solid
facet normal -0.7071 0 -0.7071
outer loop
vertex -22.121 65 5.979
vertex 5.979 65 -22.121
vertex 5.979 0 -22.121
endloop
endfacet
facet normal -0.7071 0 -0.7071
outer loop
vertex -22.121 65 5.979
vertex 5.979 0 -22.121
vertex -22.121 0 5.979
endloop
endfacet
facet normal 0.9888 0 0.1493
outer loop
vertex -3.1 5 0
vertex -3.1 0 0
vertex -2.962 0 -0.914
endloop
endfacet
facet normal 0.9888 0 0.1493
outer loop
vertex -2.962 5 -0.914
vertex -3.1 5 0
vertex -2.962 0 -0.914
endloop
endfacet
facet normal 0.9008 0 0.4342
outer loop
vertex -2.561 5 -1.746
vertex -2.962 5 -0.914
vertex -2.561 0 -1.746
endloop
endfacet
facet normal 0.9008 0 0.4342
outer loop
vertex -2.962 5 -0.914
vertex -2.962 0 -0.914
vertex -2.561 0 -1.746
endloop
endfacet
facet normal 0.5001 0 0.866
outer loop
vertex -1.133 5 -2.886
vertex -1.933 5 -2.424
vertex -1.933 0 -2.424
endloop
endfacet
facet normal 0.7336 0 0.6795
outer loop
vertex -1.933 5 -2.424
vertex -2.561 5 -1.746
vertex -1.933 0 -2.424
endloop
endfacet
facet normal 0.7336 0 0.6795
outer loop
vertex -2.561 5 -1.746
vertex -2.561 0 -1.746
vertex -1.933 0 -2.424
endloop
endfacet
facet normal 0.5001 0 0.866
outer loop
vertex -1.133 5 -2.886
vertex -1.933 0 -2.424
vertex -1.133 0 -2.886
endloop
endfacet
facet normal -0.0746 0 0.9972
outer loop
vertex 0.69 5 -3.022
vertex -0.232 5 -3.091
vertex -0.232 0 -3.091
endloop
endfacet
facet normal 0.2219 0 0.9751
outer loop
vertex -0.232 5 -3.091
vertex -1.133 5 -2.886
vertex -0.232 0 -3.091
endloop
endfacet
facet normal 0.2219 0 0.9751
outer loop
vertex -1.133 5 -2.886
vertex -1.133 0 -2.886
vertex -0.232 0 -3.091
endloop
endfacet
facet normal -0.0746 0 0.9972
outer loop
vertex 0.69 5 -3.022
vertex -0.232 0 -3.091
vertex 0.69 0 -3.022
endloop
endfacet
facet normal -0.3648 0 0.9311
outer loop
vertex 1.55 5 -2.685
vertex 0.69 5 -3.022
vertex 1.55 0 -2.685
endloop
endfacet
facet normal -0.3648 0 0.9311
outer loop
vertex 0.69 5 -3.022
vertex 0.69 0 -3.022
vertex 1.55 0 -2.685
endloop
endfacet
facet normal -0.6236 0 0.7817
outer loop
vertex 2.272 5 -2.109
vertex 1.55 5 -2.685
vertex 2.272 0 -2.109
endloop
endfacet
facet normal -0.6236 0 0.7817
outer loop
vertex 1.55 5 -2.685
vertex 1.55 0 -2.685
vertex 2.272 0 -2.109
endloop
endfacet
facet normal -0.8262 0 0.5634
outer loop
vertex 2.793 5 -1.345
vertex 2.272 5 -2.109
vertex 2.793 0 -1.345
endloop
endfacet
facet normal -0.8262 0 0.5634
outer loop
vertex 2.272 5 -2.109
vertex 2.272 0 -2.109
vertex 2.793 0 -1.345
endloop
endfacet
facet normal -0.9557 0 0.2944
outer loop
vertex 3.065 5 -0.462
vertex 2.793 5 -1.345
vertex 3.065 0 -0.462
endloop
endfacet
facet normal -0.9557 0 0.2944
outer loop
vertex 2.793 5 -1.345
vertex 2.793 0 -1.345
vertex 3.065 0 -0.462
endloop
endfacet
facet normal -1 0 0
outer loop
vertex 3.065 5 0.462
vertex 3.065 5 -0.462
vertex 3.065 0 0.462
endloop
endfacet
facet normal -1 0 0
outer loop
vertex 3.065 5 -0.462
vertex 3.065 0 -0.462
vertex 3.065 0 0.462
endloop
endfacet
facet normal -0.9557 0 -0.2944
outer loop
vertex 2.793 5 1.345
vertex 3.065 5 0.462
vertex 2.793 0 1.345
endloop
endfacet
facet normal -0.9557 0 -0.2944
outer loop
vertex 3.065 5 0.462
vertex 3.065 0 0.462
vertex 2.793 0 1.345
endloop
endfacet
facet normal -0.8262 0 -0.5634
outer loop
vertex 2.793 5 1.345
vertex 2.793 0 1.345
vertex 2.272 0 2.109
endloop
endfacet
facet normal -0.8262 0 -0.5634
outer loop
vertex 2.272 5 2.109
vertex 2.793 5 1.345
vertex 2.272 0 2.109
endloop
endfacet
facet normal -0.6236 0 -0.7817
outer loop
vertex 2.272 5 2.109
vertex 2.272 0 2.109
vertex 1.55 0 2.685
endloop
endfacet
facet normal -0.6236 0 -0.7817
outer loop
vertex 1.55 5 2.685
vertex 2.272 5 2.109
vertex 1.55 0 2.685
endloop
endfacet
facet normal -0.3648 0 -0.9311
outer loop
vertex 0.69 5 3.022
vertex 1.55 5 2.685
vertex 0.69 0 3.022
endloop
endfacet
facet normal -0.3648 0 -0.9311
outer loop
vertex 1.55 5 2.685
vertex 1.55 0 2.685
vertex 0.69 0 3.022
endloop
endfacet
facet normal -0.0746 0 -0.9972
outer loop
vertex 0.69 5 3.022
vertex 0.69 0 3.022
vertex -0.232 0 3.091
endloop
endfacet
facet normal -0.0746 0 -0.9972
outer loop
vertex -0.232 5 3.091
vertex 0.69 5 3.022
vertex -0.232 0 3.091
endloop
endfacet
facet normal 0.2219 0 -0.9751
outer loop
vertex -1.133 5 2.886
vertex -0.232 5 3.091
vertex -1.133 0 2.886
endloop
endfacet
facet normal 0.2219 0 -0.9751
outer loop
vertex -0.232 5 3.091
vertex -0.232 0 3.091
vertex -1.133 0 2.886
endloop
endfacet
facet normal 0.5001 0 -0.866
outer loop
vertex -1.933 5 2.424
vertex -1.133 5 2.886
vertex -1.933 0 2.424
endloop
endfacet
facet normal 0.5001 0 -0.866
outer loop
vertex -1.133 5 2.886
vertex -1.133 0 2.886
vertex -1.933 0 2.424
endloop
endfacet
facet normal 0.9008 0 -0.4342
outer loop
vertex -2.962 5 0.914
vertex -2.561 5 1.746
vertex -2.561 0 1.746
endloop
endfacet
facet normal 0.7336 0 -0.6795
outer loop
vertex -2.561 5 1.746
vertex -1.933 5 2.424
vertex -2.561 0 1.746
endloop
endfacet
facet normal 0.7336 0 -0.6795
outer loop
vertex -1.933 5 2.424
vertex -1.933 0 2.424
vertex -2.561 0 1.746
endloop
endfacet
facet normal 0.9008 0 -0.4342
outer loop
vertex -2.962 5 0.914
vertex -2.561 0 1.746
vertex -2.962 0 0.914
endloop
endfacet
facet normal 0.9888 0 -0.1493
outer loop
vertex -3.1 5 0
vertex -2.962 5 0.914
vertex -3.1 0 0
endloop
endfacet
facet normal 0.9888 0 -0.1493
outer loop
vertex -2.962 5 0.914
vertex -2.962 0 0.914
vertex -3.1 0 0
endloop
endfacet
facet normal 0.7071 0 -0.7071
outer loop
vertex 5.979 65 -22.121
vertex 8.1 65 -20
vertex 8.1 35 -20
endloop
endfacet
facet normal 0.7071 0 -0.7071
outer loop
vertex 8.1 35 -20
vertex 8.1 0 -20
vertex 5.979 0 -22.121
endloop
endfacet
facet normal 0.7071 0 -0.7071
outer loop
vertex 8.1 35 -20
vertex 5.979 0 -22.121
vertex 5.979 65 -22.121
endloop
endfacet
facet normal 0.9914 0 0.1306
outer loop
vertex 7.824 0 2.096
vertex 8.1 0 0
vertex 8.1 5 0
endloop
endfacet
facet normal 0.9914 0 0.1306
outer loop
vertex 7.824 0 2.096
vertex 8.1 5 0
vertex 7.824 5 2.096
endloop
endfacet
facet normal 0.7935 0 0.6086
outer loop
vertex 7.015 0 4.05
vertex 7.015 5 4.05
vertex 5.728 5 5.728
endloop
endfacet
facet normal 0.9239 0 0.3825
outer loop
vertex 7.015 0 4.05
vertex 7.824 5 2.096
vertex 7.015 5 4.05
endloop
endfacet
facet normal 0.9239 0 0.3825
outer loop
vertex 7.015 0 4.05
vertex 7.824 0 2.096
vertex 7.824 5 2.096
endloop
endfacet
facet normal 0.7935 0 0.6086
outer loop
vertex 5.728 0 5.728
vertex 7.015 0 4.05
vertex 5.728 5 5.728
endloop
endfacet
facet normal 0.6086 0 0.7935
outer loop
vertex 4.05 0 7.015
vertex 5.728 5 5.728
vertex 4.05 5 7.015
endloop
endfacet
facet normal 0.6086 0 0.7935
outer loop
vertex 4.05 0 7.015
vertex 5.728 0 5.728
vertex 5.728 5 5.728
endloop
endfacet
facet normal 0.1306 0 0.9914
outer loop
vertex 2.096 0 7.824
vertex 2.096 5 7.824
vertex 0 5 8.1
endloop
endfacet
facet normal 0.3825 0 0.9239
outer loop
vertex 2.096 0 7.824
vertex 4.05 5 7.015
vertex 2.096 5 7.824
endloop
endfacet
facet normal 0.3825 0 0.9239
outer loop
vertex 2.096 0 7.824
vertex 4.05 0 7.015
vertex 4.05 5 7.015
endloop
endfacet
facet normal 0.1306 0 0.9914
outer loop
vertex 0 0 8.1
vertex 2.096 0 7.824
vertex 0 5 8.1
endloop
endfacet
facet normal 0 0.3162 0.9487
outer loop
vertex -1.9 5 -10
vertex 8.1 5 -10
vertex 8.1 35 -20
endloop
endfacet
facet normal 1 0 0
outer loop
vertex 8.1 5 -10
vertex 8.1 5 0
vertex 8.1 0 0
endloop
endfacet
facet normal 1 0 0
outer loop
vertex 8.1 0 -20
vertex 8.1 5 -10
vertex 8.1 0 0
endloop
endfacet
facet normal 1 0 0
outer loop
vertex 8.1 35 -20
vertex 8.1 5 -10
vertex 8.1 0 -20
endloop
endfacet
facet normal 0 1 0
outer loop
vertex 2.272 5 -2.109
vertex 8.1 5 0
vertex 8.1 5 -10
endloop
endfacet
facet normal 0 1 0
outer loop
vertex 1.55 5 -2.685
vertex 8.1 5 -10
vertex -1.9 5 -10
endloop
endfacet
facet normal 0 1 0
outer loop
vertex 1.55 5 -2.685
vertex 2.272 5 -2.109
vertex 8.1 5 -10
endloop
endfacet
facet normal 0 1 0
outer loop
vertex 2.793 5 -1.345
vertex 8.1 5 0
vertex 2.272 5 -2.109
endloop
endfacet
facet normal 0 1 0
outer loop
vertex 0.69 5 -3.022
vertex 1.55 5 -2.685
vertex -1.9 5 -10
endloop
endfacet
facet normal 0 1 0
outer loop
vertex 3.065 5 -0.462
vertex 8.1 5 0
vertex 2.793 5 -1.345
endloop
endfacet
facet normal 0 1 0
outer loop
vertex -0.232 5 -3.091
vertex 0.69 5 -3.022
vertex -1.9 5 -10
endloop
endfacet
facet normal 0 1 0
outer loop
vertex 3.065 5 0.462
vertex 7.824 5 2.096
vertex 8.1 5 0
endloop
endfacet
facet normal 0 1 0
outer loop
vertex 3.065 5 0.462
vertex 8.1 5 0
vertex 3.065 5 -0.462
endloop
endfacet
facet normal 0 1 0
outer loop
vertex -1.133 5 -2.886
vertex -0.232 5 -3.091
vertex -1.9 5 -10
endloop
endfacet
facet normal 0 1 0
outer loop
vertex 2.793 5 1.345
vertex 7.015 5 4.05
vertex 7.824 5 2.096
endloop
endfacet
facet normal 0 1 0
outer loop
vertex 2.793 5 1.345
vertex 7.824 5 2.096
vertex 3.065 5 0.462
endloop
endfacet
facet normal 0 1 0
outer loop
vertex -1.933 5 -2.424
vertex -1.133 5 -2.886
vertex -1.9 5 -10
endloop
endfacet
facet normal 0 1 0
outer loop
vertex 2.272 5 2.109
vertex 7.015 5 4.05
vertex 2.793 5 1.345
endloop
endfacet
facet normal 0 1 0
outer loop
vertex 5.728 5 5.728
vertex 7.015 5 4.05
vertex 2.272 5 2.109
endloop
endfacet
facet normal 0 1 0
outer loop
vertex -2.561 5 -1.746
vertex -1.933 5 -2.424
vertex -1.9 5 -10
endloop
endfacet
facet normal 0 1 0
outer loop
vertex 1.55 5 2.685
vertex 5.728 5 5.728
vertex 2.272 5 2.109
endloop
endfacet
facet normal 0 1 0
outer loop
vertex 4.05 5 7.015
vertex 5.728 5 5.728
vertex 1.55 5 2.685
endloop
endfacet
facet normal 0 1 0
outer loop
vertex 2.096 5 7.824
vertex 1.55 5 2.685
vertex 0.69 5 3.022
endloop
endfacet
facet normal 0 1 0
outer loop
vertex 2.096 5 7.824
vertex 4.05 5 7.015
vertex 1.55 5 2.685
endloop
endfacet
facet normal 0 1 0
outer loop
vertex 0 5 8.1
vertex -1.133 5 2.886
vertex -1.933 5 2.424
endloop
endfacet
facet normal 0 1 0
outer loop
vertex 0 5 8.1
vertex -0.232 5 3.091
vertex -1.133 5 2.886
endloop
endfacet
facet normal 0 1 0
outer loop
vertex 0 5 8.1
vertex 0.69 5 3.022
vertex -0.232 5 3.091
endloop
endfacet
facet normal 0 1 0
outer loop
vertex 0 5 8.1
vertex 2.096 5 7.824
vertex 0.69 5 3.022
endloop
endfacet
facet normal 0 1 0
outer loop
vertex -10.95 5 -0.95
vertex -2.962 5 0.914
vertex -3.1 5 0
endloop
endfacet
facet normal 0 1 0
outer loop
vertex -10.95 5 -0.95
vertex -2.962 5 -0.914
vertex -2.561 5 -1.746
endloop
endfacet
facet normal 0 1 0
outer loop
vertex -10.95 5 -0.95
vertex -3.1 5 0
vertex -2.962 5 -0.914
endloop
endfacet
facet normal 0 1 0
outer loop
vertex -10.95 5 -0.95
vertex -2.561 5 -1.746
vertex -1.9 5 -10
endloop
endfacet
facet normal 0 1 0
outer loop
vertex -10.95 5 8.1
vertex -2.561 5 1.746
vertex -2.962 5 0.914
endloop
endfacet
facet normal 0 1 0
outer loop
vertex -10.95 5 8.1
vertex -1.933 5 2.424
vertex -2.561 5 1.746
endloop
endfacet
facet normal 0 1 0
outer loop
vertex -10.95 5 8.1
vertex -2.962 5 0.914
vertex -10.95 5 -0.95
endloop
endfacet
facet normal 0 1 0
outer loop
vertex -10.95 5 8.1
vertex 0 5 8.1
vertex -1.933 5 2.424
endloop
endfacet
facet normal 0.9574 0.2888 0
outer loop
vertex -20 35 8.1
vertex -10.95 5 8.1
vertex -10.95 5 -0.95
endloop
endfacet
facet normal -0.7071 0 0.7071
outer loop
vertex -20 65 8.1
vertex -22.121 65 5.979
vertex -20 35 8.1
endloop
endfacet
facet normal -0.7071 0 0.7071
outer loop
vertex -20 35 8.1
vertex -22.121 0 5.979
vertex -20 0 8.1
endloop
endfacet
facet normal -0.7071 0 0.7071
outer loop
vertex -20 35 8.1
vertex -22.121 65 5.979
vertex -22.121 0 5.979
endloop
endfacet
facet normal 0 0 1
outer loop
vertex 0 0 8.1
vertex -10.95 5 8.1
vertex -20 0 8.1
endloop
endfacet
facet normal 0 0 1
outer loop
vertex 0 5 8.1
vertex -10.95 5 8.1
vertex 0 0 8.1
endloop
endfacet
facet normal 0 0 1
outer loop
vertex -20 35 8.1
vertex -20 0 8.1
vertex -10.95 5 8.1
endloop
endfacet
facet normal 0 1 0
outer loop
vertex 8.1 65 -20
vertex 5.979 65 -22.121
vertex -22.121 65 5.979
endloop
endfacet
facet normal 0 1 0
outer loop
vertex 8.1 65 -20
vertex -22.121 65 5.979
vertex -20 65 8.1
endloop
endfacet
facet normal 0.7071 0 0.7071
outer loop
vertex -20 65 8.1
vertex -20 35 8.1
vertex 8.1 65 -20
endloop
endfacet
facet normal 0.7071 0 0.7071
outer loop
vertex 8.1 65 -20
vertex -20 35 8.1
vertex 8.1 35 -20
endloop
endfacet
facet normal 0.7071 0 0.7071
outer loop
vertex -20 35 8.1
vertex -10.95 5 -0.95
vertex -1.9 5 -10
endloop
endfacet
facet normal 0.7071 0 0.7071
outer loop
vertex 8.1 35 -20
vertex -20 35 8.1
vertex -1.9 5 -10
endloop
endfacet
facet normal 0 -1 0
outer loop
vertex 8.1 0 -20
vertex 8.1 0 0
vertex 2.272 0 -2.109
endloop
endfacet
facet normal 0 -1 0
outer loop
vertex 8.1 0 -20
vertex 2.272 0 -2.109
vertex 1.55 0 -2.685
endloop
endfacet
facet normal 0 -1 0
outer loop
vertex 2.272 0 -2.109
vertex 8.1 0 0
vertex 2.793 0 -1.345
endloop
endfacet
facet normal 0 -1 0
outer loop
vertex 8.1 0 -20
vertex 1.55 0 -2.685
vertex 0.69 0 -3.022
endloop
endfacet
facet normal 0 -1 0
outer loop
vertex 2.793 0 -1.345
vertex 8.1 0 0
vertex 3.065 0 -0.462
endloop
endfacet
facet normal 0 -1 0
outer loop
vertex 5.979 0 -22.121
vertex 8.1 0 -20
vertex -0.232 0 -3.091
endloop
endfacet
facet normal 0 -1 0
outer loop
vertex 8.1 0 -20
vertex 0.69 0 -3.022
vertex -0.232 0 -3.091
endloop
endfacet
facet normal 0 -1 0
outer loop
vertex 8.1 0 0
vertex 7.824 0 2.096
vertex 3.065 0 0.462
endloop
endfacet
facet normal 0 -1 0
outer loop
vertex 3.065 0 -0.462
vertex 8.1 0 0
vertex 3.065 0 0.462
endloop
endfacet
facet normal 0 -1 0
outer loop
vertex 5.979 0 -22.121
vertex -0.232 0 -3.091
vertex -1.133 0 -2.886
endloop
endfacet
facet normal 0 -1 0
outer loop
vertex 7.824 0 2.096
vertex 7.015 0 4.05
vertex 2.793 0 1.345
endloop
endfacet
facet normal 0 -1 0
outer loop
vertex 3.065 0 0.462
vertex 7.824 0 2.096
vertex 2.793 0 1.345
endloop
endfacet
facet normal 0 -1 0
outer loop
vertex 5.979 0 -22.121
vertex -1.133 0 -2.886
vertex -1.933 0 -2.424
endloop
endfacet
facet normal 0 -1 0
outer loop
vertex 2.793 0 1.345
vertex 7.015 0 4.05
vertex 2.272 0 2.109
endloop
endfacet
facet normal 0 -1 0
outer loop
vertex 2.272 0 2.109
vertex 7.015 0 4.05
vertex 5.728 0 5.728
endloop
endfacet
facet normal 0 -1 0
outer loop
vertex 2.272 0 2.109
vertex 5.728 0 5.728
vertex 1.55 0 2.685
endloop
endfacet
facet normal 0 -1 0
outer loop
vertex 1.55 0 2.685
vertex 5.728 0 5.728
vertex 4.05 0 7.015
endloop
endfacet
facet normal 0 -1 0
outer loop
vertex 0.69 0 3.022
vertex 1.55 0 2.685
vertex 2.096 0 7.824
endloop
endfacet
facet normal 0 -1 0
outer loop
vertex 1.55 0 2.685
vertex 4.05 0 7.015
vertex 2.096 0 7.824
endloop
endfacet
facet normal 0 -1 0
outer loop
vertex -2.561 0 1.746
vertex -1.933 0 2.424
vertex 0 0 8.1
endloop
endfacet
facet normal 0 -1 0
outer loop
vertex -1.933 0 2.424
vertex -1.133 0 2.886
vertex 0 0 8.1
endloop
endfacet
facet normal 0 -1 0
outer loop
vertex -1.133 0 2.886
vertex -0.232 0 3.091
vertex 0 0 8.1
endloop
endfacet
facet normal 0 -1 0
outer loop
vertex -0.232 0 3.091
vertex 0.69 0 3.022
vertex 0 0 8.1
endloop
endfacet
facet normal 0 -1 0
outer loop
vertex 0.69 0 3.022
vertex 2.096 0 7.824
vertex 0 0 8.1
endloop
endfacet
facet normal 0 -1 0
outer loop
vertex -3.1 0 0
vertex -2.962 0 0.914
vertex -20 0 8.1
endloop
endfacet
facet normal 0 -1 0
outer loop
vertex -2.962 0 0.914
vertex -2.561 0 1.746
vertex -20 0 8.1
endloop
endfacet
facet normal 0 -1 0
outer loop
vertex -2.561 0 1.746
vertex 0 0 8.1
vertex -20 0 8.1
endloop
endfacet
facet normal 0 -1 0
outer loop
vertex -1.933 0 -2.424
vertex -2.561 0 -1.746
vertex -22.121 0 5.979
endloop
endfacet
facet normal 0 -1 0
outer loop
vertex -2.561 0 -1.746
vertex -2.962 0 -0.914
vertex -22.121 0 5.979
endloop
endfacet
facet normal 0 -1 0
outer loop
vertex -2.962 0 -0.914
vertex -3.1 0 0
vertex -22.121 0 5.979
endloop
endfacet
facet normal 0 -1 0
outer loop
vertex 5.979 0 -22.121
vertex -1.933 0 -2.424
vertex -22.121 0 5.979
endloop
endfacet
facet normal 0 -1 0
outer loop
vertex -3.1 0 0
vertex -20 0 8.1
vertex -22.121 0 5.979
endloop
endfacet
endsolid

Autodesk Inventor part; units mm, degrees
ref_plane "YZ Plane" through (0, 0, 0) normal (1, 0, 0) x (0, 1, 0)
ref_plane "XZ Plane" through (0, 0, 0) normal (0, 1, 0) x (-1, 0, 0)
ref_plane "XY Plane" through (0, 0, 0) normal (0, 0, 1) x (1, 0, 0)
sketch "스케치1" plane through (0, 0, 0) normal (0, 1, 0) x (-1, 0, 0)
  circle A0 centre (0, 0) radius 3.1
  circle A1 centre (0, 0) radius 8.1
  line L0 (-8.1, 0) -> (-8.1, -20)
  line L1 (0, 8.1) -> (20, 8.1)
  line L2 (20, 8.1) -> (-8.1, -20)
  line L3 (20, 8.1) -> (22.1213, 5.9787)
  line L4 (22.1213, 5.9787) -> (-5.9787, -22.1213)
  line L5 (-5.9787, -22.1213) -> (-8.1, -20)
  dimension "d0" = 6.2
  dimension "d1" = 5
  dimension "d2" = 20
  dimension "d3" = 20
  dimension "d4" = 3
extrude "돌출1" add sketch "스케치1" along normal blind 5
sketch "스케치2" plane through (0, 5, 0) normal (0, 1, 0) x (1, 0, 0)
  line L0 (-22.1213, -5.9787) -> (-20, -8.1) projected
  line L1 (-20, -8.1) -> (8.1, 20)
  line L2 (5.9787, 22.1213) -> (-22.1213, -5.9787) projected
  line L3 (8.1, 20) -> (5.9787, 22.1213)
  line L4 (5.9787, 22.1213) -> (-22.1213, -5.9787)
  line L5 (-22.1213, -5.9787) -> (-20, -8.1)
  point P0 (0, 0)
extrude "돌출2" add sketch "스케치2" along normal blind 60
sketch "스케치3" plane through (8.1, 0, 0) normal (1, 0, 0) x (0, 0, -1)
  line L0 (0, 5) -> (20, 5) projected
  line L1 (10, 5) -> (20, 35)
  line L2 (20, 5) -> (20, 65) projected
  line L3 (10, 5) -> (20, 5)
  line L4 (20, 5) -> (20, 35)
  point P0 (0, 0)
extrude "돌출3" add sketch "스케치3" against normal blind 10
sketch "스케치4" plane through (-20, 0, 8.1) normal (0, 0, 1) x (1, 0, 0)
  line L0 (18.1, 5) -> (0, 5) projected
  line L1 (9.05, 5) -> (0, 35)
  line L2 (0, 5) -> (0, 65) projected
  line L3 (9.05, 5) -> (0, 5)
  line L4 (0, 5) -> (0, 35)
  point P0 (20, 0)
extrude "돌출4" add sketch "스케치4" against normal blind 10
sketch "스케치5" plane through (-22.1213, 0, 5.9787) normal (-0.7071, 0, 0.7071) x (0.7071, 0, 0.7071)
  line L0 (3, 0) -> (0, 0) projected
  line L1 (0, 35) -> (-4.0711, 35) projected
  line L2 (0, 0) -> (-4.0711, 0)
  line L3 (-4.0711, 0) -> (-4.0711, 35)
  line L4 (-4.0711, 35) -> (0, 35)
  line L5 (0, 35) -> (0, 0)
  point P0 (11.4146, 0)
extrude "돌출5" cut sketch "스케치5" against normal through all
properties part number "motor_limit_2"
